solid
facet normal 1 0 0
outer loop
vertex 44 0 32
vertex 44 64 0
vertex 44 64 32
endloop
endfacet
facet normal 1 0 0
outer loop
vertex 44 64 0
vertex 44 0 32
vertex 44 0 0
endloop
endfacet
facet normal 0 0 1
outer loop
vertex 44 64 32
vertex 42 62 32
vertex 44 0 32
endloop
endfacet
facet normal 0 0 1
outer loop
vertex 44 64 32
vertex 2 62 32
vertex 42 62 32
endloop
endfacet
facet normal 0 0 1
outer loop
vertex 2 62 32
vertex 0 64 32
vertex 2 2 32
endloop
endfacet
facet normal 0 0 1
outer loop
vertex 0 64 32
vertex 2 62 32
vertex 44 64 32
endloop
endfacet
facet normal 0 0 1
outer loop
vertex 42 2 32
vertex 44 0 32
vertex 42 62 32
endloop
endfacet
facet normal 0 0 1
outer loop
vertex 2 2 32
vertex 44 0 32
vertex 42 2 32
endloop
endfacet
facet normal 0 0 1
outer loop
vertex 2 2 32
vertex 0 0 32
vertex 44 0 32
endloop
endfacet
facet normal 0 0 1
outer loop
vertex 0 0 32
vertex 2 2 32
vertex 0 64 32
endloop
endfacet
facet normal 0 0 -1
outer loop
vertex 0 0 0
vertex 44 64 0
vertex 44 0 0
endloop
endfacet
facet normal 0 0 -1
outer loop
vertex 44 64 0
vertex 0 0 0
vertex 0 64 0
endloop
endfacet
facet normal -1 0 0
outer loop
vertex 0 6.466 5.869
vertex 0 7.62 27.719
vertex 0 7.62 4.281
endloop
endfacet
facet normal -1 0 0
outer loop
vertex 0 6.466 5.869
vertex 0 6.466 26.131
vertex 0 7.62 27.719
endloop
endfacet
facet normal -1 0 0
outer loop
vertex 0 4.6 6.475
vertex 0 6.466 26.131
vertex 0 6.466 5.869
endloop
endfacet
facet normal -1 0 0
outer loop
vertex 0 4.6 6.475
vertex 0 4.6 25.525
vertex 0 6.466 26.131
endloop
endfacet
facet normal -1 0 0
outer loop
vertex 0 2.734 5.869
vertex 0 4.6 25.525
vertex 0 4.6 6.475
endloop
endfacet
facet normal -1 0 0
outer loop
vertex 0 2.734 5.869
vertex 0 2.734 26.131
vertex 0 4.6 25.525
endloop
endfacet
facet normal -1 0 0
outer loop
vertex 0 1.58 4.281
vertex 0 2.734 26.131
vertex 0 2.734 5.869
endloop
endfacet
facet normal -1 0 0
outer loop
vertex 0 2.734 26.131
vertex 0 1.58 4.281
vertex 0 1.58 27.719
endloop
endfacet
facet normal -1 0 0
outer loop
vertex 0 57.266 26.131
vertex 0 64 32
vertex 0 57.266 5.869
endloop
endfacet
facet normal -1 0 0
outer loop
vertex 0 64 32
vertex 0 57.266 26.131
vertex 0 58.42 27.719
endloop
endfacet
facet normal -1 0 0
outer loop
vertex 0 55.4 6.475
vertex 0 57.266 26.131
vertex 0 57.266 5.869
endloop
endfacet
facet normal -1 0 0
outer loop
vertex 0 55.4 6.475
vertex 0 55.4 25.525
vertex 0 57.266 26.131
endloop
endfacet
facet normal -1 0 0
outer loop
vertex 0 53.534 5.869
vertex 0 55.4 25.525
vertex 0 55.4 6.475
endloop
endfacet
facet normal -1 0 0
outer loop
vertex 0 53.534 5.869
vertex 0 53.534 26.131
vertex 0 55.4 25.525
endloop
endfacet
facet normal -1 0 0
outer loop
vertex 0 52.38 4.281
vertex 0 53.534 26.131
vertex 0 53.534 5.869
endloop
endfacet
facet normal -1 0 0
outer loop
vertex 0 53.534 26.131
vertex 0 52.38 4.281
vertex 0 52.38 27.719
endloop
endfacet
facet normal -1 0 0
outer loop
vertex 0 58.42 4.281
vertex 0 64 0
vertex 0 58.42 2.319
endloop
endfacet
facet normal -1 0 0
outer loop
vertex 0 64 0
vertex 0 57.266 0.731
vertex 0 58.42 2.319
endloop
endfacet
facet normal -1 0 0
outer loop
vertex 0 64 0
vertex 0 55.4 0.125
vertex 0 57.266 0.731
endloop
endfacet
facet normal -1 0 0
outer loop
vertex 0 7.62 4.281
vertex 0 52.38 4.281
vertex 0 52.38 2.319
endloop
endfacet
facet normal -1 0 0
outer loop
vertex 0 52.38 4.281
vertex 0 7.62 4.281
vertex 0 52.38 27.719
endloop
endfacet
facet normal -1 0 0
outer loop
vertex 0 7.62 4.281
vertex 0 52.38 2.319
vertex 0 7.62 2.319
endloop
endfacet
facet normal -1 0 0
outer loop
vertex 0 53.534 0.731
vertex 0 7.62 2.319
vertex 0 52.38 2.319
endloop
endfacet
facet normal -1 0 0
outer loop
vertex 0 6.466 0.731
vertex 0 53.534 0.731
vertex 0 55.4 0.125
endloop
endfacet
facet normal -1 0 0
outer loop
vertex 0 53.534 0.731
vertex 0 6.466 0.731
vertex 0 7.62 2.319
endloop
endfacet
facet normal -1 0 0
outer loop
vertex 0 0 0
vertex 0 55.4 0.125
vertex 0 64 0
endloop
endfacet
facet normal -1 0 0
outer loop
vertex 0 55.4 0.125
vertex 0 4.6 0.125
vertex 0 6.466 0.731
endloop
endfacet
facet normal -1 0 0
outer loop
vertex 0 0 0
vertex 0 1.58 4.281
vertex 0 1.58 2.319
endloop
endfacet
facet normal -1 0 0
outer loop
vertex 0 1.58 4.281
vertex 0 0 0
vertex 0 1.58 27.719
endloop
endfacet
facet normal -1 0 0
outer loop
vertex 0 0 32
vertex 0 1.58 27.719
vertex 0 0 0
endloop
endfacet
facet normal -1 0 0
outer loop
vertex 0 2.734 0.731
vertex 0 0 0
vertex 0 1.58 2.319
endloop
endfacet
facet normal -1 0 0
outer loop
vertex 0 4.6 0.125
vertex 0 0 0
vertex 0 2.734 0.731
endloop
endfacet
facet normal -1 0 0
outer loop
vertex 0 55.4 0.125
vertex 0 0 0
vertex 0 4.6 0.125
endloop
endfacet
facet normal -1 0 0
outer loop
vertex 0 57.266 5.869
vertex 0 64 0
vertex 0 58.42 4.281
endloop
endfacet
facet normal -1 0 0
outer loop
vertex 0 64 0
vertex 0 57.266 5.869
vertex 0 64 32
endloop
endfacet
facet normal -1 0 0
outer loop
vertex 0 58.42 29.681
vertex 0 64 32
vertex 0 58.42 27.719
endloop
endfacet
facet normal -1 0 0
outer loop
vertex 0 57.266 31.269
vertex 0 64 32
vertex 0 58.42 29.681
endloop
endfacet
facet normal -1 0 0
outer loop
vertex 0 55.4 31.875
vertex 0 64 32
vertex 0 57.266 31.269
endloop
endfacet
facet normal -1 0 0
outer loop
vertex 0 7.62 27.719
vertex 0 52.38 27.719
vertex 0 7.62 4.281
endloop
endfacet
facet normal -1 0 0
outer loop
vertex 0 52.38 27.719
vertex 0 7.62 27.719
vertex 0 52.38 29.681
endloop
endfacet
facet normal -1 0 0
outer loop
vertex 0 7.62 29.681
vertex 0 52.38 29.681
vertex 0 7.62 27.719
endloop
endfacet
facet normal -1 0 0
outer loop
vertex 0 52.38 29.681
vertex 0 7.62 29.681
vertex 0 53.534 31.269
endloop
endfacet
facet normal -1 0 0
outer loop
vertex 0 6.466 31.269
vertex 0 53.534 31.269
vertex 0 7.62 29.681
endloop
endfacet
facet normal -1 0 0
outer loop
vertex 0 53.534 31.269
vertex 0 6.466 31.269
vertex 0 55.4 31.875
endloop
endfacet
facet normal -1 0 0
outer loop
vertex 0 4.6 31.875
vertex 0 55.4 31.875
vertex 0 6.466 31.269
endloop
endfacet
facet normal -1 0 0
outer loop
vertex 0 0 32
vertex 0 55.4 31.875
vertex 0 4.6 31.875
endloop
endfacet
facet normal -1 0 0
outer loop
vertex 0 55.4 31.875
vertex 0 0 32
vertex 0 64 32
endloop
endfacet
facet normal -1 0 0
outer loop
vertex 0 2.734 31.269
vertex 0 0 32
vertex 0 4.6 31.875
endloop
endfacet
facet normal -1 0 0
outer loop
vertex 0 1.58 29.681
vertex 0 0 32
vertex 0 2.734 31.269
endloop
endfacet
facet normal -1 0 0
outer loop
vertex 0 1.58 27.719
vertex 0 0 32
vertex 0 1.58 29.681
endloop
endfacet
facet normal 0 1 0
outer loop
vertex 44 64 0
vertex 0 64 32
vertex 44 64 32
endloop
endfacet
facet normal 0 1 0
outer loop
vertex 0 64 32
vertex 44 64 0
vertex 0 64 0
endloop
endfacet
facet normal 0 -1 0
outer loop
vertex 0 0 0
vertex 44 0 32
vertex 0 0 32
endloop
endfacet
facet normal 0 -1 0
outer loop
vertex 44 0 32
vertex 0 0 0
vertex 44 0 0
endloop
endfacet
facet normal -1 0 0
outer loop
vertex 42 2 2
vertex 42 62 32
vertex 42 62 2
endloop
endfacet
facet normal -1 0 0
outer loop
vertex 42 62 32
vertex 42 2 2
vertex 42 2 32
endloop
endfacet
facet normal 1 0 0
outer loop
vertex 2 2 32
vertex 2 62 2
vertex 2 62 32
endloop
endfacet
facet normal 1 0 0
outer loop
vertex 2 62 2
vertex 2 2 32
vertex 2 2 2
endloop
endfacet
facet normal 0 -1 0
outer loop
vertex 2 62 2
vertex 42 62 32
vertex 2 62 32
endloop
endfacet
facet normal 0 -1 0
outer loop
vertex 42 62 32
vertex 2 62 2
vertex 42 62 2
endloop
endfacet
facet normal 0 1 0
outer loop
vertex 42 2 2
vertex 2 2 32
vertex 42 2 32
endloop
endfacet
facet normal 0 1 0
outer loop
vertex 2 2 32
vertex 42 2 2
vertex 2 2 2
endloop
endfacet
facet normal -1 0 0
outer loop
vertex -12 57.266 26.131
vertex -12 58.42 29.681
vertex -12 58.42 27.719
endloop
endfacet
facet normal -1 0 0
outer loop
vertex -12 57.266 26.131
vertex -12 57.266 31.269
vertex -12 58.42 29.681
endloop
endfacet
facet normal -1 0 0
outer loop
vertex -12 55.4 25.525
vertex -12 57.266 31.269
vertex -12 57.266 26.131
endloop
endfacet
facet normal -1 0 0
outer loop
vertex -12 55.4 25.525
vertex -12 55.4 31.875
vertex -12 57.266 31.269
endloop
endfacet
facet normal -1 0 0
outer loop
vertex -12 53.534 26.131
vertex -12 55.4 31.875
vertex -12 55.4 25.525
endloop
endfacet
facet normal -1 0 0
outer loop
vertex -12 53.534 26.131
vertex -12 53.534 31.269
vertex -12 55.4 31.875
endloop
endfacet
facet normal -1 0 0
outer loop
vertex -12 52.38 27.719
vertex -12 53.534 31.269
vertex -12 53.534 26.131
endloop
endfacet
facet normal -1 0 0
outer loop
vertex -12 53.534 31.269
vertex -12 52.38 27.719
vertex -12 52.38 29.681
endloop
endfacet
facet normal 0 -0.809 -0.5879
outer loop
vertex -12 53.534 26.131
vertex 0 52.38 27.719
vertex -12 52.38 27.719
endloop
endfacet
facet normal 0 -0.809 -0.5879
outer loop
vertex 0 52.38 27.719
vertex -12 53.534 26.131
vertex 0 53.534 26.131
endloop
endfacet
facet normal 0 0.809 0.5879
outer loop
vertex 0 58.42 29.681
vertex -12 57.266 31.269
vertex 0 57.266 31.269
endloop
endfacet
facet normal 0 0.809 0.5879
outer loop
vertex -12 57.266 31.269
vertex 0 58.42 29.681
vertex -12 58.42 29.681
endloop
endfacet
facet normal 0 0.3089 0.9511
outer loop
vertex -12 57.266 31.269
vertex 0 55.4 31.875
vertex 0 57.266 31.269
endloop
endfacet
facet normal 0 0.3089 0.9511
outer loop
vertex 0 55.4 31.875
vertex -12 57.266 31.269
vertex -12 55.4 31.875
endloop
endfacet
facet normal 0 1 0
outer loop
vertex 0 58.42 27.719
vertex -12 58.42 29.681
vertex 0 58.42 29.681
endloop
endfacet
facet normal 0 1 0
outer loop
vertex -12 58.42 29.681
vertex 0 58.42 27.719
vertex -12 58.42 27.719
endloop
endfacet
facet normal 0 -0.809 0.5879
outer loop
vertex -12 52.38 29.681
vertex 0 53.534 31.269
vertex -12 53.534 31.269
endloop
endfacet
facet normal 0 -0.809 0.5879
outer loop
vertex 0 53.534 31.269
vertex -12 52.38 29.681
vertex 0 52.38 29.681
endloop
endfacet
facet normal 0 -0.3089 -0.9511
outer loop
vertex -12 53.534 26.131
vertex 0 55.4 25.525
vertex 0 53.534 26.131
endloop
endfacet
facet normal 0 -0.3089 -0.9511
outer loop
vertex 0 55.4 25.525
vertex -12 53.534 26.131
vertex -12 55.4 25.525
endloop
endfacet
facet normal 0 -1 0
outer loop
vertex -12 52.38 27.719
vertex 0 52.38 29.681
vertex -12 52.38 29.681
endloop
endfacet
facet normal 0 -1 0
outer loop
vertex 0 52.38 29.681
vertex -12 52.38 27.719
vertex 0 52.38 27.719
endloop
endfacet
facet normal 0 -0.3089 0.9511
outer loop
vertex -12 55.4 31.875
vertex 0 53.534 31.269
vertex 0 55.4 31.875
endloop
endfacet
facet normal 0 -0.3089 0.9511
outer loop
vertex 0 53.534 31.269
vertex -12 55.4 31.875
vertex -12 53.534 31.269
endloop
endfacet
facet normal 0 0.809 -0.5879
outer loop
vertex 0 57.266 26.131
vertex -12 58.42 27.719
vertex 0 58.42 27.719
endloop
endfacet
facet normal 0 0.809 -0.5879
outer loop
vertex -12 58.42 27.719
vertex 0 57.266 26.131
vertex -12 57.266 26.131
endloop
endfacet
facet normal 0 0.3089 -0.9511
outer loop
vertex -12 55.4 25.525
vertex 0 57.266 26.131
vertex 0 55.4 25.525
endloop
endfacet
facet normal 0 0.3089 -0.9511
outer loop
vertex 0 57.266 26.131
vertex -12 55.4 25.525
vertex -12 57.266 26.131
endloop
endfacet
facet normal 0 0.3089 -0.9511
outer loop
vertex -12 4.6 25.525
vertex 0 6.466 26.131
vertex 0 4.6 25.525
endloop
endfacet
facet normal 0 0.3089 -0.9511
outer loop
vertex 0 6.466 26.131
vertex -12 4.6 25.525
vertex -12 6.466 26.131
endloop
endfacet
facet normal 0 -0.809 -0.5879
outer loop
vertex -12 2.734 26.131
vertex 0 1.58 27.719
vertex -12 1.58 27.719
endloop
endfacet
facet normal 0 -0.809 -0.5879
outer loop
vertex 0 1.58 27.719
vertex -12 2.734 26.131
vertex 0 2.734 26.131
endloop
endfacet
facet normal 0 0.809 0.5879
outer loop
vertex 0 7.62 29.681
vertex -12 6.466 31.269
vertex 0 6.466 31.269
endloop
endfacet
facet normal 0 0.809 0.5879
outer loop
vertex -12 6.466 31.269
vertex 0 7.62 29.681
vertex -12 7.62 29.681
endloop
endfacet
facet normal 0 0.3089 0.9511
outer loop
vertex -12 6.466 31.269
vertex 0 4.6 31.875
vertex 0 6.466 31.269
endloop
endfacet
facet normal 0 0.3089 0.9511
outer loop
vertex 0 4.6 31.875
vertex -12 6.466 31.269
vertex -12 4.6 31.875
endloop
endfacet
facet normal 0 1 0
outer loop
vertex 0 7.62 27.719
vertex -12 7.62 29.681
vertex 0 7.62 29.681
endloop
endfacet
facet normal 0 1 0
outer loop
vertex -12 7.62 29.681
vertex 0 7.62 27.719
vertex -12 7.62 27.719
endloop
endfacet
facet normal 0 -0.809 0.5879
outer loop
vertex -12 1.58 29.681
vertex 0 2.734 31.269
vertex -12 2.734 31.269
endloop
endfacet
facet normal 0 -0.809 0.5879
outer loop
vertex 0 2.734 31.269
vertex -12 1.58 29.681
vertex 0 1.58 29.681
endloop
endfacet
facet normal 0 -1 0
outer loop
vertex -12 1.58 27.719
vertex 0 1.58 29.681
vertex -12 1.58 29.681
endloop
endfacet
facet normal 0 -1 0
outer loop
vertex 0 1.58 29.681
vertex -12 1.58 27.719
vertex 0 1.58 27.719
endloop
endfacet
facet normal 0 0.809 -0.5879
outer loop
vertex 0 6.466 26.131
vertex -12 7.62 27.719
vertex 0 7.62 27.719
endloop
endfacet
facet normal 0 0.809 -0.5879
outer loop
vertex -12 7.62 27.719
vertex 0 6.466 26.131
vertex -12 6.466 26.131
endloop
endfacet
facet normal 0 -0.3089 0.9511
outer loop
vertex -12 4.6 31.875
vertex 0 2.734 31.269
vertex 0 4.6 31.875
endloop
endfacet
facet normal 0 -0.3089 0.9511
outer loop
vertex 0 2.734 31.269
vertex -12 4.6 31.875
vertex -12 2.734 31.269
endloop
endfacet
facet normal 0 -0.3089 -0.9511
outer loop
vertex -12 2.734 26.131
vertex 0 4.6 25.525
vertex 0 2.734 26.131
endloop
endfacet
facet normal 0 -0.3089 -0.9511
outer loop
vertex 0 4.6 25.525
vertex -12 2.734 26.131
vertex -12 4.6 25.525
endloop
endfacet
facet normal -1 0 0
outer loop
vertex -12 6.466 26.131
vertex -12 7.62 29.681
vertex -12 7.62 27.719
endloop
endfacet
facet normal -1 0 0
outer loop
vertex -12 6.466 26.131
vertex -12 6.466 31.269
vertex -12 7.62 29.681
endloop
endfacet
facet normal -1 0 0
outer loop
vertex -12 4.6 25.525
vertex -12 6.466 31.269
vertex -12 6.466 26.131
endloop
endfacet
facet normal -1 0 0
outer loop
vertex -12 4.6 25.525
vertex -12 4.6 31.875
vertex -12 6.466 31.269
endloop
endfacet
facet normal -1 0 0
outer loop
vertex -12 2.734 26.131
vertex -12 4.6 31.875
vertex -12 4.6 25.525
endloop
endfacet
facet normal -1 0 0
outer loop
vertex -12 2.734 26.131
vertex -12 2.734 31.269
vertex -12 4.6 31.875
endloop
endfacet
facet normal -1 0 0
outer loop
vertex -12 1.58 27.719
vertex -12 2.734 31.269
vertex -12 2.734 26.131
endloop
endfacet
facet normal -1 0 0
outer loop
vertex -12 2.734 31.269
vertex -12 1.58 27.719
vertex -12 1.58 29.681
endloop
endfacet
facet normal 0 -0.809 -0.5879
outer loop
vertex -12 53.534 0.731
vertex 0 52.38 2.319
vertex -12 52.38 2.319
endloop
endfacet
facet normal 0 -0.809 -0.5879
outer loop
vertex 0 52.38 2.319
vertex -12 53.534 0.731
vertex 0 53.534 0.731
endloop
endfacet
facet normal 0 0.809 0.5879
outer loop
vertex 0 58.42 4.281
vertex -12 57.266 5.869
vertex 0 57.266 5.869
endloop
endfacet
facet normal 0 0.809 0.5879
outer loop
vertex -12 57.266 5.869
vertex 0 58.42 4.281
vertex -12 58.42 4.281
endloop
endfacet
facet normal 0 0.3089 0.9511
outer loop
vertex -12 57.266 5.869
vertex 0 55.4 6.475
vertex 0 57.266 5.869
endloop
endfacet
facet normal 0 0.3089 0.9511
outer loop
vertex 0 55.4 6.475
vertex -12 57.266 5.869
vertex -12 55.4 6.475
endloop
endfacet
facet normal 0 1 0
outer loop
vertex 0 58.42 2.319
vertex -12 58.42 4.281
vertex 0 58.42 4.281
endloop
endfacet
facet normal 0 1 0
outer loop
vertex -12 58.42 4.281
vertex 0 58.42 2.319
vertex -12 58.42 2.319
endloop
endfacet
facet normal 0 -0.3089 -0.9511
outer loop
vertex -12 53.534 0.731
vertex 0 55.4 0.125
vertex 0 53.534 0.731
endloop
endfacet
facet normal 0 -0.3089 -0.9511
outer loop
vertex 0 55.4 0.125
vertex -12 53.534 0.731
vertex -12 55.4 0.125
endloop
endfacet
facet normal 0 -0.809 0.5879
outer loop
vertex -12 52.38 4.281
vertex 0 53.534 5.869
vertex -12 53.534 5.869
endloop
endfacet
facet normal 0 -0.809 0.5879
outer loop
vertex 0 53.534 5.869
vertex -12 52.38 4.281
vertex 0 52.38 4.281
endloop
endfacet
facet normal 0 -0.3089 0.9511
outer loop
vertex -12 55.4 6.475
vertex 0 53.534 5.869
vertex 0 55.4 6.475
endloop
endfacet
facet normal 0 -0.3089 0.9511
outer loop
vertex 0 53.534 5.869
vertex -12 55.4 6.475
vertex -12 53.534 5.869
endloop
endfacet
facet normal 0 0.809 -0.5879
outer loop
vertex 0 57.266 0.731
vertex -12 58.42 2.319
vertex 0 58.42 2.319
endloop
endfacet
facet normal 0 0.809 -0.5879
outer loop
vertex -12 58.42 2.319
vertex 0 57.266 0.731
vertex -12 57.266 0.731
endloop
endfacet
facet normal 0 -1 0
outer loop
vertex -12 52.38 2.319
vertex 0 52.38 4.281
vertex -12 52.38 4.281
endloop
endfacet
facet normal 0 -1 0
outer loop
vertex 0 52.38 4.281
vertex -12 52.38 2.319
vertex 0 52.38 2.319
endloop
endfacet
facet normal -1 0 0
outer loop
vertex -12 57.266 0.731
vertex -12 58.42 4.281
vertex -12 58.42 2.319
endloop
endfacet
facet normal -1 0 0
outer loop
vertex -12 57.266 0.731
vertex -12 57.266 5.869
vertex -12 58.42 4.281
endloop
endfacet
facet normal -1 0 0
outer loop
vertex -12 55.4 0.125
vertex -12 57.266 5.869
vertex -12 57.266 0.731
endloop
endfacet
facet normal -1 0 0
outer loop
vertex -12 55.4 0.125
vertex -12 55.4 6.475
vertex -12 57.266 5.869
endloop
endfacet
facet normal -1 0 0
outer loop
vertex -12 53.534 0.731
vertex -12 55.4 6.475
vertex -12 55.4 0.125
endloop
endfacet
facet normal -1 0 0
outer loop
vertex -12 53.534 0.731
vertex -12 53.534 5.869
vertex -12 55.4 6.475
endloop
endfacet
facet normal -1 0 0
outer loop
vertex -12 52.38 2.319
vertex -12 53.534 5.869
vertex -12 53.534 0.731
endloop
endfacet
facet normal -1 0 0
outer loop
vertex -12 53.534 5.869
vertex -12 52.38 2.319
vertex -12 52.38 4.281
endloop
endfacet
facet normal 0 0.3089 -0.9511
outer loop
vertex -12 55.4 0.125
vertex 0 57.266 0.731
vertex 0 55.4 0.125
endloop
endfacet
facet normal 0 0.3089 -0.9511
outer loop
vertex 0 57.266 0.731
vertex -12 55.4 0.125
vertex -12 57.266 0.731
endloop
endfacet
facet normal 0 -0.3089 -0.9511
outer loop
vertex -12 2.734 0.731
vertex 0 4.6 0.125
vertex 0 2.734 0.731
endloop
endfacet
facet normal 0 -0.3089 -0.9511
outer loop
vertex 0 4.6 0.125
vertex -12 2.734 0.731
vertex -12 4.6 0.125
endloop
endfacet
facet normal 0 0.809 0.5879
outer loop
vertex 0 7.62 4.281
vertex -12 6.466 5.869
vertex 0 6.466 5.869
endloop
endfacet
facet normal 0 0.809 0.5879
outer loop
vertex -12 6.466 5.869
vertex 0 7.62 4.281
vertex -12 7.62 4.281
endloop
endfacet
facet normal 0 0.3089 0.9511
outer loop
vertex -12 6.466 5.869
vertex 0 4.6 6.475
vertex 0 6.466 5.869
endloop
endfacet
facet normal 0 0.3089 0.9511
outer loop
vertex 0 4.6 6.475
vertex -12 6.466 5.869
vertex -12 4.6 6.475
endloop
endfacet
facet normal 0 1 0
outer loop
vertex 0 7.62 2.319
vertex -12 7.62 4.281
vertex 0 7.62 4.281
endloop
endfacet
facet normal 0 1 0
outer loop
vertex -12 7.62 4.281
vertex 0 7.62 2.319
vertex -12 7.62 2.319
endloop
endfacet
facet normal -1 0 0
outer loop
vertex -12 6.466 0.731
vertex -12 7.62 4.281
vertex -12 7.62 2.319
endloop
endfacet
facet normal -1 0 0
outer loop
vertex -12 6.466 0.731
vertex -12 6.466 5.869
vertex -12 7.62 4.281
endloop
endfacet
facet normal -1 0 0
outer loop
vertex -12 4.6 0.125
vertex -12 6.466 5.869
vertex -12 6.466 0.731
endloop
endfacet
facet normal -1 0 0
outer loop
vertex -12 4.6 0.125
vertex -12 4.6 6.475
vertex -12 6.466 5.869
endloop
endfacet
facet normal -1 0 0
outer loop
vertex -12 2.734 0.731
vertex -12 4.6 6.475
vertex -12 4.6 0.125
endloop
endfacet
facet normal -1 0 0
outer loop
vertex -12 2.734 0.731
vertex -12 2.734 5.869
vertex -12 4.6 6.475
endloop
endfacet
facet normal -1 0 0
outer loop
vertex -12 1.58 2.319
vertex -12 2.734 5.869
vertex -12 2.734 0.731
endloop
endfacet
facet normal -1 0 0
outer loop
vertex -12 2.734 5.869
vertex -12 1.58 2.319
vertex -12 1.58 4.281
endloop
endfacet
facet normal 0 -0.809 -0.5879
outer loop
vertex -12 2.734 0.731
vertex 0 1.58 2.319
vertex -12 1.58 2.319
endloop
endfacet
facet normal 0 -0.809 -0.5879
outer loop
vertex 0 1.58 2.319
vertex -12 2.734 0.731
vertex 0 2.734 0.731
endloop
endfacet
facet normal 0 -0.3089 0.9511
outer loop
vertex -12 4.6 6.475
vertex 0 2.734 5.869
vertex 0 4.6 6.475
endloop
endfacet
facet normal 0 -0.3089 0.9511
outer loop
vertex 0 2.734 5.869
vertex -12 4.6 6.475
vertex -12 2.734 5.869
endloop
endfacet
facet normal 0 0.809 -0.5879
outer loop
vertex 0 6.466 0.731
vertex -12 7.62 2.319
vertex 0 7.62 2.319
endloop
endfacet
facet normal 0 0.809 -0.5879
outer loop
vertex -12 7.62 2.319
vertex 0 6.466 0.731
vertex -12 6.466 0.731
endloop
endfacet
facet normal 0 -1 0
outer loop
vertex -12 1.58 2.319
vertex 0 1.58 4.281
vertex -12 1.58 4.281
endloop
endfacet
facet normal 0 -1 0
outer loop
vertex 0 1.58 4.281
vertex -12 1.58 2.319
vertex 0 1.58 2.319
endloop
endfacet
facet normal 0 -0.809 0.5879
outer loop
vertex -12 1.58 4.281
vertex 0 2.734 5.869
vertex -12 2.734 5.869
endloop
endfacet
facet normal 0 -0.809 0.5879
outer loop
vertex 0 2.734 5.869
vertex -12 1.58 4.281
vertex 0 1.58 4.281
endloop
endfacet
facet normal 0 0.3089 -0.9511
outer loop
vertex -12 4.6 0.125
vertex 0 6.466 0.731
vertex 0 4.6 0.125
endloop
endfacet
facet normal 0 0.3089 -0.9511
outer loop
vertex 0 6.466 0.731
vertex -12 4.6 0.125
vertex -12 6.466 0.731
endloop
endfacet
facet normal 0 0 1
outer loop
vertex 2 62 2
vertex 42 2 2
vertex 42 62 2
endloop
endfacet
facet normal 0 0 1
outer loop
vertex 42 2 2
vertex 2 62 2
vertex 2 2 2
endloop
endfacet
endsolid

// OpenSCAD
////////////////////////////////////////////////////////////////////////////
// Manhattan Pegboard Collection v1 : 4 Peg Bin
// designed in NYC by Matt Manhattan (mattmanhattan.com)
////////////////////////////////////////////////////////////////////////////

// These parameters create the INTERIOR size of your bin (in mm)

width = 60; // This is the width of the shelf -- MINIMUM is '32' for 2 rows of pegs
depth = 40; // This is the depth of the shelf
height = 32; // This is the height of the shelf -- MINIMUM is '32' for 2 rows of pegs
thickness = 2; // This is the thickness of the shelf
pegs = 2; // span between pegs [0 = centered (one peg // 1 = 2 pegs // 2 = 3 pegs // 3 = 4 pegs]

//////////////////////////////////////////////////////////////////
// Pegboard Bin
//////////////////////////////////////////////////////////////////

 // This code generates the rectangular shape of your bin
 
 difference()
    {
        // this is the exterior shape
        cube ([depth+(thickness*2),width+(thickness*2),height]); 
       
        // this is the interior shape which we are removing
        translate([thickness,thickness,0])
        {    
            cube ([depth,width,height]);
        }
    }
    
// This code generates the base of the bin
// if you comment it out you will remove the base of your bin which can be useful for tools
    
   cube([depth+(thickness*2),width+(thickness*2),thickness], centerequals);
     
//////////////////////////////////////////////////////////////////
// Pegboard Pegs
//////////////////////////////////////////////////////////////////

pegCenterToCenterDistance = 25.4; 	    // 1 inch spacing
pegDiameter = 6.35; 					// 1/4 inch peg holes
pegLength = 12;                         // length of the pegs
midpointY = width/2;
midpointZ = height/2;
    
// leave this alone - it alters the center point of the model
centerequals = false; 
///////////////////

// this rotates the pegs 90 degrees
rotate([0,-90,0])
    {    
    translate([(midpointZ+((pegCenterToCenterDistance/2))),(midpointY+((pegCenterToCenterDistance/2)*pegs)),0])    // moves PEG 1 to its position
        { 
        cylinder(h=pegLength, r=(pegDiameter/2), center=centerequals);  // PEG 1 (top left)
        }
        
    translate([(midpointZ+((pegCenterToCenterDistance/2))),(midpointY-((pegCenterToCenterDistance/2)*pegs)),0])    // moves PEG 2 to its position
        {    
        cylinder(h=pegLength, r=(pegDiameter/2), center=centerequals); // PEG 2 (top right)
        }
        
    translate([(midpointZ-((pegCenterToCenterDistance/2))),(midpointY+((pegCenterToCenterDistance/2)*pegs)),0])    // moves PEG 3 to its position
        { 
        cylinder(h=pegLength, r=(pegDiameter/2), center=centerequals);  // PEG 3 (bottom left)
        }
        
    translate([(midpointZ-((pegCenterToCenterDistance/2))),(midpointY-((pegCenterToCenterDistance/2)*pegs)),0])    // moves PEG 4 to its position
        {    
        cylinder(h=pegLength, r=(pegDiameter/2), center=centerequals); // PEG 4 (bottom right)
        }
    }
    
    
    

 
